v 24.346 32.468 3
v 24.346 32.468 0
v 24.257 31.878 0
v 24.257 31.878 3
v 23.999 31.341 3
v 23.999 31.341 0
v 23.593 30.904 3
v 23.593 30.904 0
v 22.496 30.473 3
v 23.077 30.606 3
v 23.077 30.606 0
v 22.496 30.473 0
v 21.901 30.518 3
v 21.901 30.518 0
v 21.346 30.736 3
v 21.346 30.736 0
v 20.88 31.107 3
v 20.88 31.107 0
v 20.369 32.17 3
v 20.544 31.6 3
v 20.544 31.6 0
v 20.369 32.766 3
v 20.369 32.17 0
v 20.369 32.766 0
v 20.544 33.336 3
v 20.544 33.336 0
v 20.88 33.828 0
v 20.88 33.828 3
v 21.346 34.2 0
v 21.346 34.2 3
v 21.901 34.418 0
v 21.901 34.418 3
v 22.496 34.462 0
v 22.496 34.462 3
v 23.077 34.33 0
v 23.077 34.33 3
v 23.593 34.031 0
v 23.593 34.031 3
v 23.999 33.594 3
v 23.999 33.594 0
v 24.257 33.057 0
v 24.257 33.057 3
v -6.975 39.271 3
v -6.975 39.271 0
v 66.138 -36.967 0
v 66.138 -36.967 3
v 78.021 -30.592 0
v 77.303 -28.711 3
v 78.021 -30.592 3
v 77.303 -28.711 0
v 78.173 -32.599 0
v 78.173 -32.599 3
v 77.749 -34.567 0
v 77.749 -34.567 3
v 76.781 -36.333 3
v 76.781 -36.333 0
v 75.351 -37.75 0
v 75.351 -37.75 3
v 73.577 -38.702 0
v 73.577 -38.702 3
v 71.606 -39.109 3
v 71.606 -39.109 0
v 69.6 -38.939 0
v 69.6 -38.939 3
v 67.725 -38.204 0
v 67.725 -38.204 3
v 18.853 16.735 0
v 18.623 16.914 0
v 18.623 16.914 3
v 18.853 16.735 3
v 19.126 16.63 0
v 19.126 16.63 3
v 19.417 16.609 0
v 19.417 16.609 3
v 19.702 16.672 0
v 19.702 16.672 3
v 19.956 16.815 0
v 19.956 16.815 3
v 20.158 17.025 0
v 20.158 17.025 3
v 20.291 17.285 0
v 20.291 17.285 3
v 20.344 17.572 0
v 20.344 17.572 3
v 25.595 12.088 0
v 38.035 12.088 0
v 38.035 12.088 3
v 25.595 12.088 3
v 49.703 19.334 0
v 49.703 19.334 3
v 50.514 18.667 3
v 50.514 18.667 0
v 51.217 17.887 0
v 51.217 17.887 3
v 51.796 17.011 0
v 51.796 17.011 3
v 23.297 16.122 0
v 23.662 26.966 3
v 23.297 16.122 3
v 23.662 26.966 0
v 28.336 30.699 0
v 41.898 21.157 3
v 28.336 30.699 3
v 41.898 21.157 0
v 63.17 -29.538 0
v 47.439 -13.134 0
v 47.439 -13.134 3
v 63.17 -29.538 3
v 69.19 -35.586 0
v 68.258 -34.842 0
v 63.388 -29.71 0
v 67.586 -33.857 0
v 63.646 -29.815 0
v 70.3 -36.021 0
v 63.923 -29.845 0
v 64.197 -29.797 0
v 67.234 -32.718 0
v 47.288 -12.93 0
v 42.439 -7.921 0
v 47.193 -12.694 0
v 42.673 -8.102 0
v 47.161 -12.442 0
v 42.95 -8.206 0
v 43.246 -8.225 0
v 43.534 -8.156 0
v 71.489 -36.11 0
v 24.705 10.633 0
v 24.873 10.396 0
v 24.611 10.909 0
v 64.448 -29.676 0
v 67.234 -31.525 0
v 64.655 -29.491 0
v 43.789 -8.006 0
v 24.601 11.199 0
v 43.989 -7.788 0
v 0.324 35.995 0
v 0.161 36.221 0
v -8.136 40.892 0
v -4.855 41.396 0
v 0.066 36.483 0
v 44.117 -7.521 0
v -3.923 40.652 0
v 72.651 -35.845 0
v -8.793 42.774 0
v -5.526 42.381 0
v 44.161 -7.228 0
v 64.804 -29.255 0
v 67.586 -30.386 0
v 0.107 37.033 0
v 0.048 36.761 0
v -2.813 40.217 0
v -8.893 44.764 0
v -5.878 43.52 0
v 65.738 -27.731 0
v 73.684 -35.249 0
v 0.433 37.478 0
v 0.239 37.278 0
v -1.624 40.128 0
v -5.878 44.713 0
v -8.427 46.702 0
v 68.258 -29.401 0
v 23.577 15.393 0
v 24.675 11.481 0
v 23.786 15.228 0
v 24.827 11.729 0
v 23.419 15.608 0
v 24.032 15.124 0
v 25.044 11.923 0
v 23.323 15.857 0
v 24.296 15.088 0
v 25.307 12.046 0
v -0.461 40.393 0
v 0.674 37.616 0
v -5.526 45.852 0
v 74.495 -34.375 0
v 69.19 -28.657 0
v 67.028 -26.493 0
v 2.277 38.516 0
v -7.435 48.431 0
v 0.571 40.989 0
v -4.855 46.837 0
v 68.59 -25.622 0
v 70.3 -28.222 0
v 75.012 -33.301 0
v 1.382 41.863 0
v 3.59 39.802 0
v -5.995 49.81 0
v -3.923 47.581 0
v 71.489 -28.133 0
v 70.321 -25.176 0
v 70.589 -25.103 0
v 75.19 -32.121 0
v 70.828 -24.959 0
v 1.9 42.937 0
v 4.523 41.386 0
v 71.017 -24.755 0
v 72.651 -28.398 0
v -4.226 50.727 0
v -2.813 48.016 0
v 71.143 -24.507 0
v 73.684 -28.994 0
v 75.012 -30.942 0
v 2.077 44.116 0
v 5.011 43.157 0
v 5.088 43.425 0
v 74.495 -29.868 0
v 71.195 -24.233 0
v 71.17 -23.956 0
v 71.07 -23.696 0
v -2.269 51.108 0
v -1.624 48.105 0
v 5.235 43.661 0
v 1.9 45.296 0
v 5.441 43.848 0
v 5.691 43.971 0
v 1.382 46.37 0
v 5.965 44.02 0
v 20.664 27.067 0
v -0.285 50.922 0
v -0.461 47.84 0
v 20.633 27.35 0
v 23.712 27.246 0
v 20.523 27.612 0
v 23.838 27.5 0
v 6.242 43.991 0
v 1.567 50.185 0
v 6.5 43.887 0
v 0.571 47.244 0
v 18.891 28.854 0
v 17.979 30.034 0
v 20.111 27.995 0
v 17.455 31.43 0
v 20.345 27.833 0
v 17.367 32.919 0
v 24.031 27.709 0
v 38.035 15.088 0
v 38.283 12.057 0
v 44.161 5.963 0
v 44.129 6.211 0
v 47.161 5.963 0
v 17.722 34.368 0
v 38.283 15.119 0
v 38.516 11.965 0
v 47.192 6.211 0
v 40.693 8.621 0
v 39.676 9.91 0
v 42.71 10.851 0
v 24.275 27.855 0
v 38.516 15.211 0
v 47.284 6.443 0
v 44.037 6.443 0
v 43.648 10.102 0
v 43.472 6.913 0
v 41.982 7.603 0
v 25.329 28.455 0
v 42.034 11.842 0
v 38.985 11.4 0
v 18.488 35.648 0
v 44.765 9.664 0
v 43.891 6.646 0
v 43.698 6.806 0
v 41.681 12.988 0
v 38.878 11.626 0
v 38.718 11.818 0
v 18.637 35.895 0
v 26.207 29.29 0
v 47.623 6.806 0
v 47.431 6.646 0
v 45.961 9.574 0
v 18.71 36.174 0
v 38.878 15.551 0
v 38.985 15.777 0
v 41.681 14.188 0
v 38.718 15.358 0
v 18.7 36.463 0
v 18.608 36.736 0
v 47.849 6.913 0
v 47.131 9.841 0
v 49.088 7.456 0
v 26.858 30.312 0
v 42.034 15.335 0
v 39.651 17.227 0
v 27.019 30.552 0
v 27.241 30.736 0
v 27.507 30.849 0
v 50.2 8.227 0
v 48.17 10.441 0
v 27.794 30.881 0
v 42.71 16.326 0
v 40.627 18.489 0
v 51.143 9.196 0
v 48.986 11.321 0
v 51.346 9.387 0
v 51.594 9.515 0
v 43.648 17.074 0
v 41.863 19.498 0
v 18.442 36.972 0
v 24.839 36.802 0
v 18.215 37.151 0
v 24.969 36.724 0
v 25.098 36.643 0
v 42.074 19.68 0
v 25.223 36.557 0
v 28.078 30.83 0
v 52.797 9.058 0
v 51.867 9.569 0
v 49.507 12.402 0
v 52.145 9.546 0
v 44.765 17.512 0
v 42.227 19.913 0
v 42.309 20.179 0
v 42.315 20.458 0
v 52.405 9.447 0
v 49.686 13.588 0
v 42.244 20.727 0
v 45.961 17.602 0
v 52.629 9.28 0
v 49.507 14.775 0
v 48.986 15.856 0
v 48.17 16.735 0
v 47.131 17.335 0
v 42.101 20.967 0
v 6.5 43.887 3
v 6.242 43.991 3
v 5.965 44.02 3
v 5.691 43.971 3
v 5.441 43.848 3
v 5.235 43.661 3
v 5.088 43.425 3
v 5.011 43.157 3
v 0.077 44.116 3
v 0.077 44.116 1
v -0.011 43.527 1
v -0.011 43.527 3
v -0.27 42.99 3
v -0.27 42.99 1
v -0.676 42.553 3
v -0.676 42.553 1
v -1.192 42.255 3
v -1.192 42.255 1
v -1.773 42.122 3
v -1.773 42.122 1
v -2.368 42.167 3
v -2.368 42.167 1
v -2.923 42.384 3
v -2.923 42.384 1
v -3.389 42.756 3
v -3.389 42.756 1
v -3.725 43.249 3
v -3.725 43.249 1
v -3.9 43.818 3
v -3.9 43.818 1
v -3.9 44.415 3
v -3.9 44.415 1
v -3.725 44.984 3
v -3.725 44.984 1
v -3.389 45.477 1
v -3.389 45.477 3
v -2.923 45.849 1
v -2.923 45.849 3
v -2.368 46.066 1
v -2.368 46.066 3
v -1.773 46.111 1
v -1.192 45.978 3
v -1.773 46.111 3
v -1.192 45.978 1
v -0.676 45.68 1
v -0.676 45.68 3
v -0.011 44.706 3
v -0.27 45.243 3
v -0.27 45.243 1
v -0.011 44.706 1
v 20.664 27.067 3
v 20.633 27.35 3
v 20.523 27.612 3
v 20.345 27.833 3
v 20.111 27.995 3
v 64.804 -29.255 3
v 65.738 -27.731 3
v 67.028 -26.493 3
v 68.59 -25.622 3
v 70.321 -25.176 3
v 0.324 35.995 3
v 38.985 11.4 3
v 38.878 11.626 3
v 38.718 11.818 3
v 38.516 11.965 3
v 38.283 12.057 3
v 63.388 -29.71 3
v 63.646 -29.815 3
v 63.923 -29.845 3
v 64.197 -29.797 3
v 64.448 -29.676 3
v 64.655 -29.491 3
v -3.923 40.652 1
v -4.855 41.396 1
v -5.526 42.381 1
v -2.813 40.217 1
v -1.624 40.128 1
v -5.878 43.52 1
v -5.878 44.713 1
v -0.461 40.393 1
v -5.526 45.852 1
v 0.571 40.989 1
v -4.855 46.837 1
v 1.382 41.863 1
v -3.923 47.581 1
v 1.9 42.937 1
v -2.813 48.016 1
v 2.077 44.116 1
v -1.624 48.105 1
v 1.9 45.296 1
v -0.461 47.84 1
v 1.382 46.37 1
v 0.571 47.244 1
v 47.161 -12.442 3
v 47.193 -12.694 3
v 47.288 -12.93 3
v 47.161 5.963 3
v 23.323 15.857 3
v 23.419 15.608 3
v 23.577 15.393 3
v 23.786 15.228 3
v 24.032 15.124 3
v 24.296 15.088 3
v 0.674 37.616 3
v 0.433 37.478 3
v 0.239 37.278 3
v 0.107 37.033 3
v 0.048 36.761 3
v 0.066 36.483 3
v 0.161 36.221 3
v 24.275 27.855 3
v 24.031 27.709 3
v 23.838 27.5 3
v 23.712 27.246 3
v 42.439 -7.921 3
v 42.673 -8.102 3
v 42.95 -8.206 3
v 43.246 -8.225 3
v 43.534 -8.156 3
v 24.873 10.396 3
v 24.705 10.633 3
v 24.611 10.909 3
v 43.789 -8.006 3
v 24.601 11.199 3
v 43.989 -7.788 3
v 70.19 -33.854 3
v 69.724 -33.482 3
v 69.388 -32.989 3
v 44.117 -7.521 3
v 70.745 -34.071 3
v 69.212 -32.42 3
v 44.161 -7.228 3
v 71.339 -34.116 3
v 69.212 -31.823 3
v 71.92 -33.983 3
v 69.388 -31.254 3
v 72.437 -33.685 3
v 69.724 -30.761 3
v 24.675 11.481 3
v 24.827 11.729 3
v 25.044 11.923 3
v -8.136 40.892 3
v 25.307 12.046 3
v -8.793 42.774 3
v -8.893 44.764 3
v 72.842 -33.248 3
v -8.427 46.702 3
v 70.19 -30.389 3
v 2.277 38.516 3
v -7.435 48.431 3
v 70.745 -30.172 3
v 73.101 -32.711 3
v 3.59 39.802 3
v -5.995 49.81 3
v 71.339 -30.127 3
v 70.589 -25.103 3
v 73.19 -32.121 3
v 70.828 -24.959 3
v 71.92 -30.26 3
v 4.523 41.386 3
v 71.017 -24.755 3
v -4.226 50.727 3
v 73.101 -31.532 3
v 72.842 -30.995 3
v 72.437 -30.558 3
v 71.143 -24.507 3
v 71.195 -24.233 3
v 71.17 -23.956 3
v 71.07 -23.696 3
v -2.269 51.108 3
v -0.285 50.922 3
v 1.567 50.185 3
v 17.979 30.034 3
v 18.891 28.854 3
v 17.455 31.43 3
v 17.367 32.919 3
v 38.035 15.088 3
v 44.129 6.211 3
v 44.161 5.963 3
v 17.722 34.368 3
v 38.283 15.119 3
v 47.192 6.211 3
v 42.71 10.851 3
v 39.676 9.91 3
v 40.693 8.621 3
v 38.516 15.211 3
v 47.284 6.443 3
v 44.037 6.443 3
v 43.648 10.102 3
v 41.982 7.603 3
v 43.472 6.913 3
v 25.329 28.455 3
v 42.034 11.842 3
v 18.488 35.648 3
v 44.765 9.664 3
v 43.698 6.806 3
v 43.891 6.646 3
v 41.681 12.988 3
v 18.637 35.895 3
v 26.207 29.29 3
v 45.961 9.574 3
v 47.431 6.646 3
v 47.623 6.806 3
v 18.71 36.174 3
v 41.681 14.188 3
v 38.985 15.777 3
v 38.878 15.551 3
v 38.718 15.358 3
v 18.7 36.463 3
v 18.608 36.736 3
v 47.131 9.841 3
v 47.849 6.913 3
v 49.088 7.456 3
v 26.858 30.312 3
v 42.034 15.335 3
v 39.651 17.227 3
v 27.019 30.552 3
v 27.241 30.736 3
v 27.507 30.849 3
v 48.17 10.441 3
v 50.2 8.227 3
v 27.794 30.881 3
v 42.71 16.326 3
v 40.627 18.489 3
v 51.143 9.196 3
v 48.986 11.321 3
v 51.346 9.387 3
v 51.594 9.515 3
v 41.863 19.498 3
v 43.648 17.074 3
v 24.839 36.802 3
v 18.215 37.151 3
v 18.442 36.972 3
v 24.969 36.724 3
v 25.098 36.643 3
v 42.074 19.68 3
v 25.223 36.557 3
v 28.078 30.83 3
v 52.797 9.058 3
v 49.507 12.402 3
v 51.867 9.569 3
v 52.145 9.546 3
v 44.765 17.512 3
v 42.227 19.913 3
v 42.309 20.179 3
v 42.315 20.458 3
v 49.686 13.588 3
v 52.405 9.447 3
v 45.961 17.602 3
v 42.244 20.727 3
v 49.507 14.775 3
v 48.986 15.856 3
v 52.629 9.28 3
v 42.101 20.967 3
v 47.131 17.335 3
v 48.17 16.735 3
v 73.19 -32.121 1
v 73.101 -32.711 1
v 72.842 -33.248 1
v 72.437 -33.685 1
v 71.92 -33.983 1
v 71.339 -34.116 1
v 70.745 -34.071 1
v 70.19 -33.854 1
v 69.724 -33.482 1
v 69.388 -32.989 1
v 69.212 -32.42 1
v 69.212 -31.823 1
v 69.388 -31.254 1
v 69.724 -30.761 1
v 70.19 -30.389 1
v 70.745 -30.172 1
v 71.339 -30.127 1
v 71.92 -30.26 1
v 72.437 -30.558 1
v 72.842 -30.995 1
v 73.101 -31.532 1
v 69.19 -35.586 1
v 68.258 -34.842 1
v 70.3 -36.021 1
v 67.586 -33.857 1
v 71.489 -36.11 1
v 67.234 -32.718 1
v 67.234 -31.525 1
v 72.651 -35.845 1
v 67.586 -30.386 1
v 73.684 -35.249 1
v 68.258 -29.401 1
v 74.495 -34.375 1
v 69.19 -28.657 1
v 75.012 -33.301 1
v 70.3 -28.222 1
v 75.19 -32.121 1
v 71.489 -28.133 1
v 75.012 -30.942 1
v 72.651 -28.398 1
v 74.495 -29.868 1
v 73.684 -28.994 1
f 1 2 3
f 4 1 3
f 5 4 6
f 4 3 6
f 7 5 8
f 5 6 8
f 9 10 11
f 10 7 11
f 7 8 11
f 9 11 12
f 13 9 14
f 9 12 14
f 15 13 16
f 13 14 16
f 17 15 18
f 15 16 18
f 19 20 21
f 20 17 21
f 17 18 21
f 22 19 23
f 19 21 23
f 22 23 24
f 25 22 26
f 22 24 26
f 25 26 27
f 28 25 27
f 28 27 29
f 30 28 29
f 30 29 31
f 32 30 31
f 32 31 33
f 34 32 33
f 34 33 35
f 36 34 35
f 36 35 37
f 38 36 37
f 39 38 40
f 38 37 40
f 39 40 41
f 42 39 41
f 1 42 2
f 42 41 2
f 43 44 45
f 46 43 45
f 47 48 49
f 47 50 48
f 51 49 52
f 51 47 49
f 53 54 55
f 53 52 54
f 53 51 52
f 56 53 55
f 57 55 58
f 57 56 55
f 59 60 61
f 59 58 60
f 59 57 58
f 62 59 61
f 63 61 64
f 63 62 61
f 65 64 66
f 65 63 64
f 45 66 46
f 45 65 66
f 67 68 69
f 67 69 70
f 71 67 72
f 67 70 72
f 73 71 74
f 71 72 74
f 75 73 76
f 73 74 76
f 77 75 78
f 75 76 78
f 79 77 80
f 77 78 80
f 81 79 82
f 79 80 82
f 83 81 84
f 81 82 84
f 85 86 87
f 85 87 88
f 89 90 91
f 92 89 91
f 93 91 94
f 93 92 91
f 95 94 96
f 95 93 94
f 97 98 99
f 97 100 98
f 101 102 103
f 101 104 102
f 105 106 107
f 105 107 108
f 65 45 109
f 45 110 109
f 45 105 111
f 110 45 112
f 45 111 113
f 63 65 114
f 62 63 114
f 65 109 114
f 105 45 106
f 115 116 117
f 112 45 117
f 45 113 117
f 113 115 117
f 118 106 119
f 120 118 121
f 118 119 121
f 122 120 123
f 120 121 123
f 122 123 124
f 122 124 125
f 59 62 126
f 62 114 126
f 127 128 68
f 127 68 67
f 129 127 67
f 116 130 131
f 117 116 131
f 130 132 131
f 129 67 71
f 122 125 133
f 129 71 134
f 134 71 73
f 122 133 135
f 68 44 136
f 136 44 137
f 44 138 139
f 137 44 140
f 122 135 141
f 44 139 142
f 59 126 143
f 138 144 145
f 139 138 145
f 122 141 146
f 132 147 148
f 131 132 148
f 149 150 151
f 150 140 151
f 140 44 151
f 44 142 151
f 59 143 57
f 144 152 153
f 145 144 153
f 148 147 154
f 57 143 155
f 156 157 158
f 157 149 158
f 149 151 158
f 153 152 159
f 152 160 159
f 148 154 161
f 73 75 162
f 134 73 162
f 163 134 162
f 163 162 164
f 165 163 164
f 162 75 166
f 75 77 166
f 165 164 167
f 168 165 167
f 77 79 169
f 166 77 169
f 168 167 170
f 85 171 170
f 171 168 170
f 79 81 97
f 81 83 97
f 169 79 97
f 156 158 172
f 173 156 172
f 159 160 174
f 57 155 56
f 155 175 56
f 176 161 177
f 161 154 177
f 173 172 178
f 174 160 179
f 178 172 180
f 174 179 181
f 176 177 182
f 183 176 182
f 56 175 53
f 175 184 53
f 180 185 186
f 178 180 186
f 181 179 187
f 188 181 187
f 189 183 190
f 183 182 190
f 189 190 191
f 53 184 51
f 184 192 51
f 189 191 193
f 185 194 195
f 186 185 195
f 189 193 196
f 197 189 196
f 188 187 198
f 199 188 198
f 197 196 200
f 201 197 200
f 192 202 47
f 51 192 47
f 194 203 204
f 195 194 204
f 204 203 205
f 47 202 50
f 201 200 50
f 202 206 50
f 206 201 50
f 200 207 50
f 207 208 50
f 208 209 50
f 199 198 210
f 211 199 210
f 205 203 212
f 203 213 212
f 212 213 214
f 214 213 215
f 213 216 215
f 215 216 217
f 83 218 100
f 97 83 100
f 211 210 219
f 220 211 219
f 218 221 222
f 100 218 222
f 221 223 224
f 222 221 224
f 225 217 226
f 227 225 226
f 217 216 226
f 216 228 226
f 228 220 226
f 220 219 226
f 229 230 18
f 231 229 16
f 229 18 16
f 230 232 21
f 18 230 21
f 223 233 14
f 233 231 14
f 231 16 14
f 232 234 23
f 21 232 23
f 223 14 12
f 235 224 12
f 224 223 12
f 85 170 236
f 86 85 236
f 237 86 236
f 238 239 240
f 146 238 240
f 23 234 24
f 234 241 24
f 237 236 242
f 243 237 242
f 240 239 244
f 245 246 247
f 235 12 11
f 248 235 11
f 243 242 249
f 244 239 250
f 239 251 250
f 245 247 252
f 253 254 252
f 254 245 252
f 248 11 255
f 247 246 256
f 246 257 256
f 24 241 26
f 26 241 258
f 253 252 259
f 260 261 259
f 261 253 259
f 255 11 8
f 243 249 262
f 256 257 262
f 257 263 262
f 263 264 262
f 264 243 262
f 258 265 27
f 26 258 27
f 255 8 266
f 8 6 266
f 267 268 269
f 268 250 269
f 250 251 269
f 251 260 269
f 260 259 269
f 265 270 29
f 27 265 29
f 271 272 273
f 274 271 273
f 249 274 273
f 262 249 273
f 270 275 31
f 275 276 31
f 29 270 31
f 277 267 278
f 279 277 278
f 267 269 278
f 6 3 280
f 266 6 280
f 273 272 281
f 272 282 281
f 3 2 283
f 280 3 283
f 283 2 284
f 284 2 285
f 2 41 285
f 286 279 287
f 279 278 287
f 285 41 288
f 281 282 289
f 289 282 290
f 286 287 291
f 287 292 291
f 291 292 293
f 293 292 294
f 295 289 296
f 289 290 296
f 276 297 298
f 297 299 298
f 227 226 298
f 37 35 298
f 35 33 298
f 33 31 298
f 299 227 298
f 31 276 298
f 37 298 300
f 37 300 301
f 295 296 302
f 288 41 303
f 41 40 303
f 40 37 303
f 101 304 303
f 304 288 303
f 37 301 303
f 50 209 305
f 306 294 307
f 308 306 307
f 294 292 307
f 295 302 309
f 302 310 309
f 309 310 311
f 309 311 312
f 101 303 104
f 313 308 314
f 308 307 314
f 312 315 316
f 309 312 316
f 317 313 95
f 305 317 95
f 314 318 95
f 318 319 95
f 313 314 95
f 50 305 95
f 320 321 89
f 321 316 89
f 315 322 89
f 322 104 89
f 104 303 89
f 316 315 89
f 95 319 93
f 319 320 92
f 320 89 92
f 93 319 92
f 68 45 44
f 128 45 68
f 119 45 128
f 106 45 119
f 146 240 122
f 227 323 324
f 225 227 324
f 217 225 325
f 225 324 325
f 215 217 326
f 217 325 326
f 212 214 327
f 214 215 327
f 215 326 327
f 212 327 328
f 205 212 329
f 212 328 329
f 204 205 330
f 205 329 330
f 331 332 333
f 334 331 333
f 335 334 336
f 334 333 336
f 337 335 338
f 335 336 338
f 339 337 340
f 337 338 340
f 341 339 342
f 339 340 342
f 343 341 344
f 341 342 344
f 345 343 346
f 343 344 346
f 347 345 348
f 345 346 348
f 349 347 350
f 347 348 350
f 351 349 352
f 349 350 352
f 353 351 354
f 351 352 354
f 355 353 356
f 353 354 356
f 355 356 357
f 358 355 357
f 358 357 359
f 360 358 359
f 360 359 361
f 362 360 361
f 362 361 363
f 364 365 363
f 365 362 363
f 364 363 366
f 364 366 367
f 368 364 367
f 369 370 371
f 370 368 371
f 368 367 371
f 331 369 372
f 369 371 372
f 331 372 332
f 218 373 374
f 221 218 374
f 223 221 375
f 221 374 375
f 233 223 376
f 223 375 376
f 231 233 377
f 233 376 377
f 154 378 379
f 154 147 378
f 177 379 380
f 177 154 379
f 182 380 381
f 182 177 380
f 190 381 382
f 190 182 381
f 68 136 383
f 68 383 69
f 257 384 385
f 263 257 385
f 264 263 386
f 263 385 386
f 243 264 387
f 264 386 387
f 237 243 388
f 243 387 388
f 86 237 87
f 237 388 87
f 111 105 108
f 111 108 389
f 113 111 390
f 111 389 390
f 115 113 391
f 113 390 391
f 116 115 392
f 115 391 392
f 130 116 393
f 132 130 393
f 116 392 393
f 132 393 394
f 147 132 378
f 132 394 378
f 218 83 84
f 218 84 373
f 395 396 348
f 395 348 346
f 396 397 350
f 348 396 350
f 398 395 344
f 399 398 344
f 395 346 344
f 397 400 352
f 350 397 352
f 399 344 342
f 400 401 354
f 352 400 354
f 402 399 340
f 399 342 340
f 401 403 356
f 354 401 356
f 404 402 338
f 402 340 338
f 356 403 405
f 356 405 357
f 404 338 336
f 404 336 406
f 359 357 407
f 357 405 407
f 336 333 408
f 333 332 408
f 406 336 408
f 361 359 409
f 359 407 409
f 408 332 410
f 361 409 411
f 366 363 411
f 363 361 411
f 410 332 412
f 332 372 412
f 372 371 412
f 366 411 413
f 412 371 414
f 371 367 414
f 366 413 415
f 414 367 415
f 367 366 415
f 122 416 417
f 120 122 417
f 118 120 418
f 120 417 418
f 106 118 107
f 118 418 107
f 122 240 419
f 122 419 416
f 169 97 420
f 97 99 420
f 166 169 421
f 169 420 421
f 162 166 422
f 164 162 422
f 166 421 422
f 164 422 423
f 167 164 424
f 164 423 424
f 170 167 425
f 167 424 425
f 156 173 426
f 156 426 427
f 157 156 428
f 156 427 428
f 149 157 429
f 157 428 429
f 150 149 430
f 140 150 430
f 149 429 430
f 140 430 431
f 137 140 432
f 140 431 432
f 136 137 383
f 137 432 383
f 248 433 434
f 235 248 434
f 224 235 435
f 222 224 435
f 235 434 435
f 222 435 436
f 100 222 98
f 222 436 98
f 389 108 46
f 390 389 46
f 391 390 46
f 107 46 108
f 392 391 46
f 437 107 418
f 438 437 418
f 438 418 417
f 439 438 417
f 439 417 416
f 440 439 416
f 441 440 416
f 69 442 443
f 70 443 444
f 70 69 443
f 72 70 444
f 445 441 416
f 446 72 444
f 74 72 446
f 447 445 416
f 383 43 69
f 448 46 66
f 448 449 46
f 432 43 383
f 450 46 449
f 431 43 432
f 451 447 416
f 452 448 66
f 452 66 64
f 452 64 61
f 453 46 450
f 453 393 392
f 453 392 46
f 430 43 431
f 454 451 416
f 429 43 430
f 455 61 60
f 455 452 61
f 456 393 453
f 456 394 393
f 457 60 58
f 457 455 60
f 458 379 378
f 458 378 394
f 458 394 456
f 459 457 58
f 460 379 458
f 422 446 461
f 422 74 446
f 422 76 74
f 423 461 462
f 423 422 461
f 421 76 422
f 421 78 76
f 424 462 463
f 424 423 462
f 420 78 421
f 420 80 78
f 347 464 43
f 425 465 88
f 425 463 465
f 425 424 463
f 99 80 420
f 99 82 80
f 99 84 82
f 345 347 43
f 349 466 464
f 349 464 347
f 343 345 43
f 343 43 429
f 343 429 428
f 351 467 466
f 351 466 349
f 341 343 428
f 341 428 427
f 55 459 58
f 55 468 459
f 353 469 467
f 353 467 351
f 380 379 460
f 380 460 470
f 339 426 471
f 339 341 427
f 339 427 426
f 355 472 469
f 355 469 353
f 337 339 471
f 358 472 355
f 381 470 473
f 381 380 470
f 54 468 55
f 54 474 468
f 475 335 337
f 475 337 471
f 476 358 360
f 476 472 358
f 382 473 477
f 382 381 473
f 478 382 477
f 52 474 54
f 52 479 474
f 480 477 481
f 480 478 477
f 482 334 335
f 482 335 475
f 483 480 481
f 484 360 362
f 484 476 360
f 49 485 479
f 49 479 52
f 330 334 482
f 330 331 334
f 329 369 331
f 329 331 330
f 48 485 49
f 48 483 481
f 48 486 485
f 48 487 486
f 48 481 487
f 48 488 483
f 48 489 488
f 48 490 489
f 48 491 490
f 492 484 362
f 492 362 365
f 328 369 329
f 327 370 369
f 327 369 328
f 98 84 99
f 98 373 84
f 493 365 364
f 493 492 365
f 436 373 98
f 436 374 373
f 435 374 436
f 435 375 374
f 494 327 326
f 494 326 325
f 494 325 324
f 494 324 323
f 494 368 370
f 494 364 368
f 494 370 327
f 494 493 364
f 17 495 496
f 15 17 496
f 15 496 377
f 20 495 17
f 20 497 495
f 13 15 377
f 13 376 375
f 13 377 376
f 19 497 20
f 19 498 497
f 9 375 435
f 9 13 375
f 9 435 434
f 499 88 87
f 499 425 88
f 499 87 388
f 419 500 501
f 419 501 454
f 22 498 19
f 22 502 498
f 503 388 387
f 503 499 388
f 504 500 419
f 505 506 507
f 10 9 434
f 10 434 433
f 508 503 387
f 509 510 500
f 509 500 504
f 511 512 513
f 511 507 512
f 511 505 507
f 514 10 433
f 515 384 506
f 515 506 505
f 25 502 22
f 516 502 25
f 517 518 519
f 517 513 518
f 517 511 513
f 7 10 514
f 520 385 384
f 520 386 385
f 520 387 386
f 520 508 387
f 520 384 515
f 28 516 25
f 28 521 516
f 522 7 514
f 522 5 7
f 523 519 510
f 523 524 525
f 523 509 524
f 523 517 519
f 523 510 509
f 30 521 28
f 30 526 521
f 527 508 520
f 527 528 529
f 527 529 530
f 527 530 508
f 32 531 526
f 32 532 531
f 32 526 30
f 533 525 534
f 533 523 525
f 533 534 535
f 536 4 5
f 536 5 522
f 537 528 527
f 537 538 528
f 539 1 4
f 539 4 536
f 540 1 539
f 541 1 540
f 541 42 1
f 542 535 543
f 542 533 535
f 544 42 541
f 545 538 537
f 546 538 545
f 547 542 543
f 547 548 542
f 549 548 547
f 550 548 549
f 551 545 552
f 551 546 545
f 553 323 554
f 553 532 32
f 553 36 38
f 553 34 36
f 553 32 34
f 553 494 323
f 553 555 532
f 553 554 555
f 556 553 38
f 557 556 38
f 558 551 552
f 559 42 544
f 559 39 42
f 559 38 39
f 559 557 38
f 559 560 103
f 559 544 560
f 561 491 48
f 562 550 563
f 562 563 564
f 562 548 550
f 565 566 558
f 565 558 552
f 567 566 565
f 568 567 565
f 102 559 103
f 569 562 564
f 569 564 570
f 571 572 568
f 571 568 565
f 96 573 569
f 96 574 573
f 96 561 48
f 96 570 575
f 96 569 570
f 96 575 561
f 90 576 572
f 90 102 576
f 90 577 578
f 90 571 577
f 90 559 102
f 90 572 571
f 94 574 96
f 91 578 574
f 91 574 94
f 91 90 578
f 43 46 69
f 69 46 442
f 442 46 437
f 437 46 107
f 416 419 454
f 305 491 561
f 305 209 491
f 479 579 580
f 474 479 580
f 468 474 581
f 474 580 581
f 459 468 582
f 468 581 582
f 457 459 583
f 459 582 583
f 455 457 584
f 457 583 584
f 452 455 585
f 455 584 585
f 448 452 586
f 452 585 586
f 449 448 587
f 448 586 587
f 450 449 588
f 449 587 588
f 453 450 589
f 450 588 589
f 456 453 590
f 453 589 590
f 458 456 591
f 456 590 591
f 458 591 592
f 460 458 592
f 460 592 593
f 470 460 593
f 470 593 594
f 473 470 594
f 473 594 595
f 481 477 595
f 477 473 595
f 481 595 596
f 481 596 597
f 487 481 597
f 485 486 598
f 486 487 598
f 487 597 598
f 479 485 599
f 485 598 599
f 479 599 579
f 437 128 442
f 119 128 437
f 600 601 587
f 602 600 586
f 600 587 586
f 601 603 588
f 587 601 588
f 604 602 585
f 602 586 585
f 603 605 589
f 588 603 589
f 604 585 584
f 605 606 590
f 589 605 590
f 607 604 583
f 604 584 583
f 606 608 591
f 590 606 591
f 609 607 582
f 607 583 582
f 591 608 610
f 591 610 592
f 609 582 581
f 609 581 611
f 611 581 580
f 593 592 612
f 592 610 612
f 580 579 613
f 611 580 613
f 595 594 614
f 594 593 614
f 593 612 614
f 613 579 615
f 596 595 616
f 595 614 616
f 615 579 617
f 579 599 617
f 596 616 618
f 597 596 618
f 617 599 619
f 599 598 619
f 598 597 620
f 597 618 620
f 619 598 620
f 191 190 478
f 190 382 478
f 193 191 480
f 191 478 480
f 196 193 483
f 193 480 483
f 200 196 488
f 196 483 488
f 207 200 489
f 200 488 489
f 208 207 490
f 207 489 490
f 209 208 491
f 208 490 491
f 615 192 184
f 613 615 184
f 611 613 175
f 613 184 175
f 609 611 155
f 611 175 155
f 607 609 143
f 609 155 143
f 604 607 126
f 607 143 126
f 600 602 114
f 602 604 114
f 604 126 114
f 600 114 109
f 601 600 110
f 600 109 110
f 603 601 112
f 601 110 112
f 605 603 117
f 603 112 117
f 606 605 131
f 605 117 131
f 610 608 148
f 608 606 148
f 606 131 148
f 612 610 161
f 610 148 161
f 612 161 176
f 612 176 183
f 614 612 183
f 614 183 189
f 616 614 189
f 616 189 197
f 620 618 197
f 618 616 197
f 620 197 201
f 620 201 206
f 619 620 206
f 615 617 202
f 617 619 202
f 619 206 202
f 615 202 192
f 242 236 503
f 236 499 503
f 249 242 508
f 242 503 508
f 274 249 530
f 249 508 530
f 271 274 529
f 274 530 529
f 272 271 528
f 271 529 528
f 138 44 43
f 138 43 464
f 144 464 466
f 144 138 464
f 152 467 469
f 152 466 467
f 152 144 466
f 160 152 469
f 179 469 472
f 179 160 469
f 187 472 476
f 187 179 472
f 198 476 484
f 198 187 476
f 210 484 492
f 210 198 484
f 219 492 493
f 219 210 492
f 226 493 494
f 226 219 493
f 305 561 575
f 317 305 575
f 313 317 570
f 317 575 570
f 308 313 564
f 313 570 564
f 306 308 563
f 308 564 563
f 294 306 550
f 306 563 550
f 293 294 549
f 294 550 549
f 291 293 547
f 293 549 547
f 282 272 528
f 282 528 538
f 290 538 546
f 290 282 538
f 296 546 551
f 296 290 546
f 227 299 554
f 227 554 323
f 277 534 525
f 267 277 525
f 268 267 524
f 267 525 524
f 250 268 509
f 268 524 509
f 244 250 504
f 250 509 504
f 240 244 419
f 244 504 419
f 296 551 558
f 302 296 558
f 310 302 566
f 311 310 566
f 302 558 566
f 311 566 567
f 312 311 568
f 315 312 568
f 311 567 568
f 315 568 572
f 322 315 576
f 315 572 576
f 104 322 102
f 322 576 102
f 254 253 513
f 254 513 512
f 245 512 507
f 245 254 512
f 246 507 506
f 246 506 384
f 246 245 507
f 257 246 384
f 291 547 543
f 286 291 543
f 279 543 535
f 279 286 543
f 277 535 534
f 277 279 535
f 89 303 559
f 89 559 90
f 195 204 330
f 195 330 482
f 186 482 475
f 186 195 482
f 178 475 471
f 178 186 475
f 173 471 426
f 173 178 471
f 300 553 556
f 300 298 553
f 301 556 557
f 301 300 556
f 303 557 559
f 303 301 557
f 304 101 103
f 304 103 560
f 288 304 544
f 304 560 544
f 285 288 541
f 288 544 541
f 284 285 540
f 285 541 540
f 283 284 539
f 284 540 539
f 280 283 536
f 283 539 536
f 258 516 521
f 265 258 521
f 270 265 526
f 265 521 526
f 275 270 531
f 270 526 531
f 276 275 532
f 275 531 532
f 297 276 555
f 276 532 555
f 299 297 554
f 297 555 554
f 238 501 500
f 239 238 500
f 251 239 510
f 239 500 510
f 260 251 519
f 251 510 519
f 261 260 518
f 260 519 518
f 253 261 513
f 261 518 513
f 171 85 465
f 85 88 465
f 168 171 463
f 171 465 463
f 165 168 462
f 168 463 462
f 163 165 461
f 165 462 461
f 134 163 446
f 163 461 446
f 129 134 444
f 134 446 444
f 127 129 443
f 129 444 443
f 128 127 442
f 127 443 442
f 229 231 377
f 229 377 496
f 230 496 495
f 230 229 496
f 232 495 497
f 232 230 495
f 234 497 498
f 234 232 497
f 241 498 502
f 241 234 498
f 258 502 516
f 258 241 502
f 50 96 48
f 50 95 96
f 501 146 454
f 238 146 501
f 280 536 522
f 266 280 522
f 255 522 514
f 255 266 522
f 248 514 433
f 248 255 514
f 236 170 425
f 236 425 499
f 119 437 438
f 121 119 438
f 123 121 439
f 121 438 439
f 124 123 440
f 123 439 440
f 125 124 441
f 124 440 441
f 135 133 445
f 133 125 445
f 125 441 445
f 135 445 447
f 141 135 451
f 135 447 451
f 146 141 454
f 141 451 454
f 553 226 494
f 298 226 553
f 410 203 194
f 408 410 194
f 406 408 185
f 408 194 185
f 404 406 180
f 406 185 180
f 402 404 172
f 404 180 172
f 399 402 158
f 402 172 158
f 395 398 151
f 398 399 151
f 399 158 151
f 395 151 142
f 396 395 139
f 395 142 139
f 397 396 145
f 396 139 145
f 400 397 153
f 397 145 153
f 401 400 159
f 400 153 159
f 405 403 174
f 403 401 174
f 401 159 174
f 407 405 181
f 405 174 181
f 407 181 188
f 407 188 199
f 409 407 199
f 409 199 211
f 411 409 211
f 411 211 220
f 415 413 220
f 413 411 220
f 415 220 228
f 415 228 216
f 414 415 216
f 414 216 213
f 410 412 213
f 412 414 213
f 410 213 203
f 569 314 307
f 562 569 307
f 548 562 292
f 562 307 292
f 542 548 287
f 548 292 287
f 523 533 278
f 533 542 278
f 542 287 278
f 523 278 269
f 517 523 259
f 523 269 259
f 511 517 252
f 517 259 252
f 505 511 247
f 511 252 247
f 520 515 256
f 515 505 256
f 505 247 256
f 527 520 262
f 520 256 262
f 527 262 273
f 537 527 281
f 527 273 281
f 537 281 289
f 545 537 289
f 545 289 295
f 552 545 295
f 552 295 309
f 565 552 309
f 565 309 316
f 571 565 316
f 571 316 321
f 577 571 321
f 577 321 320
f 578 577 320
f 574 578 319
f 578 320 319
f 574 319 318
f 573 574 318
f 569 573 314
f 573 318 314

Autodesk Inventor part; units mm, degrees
ref_plane "YZ Plane" through (0, 0, 0) normal (1, 0, 0) x (0, 1, 0)
ref_plane "XZ Plane" through (0, 0, 0) normal (0, 1, 0) x (-1, 0, 0)
ref_plane "XY Plane" through (0, 0, 0) normal (0, 0, 1) x (1, 0, 0)
sketch "スケッチ1" plane through (0, 0, 0) normal (0, 0, 1) x (1, 0, 0)
  circle A0 centre (-1.9226, 44.1165) radius 4
  circle A1 centre (71.1898, -32.1215) radius 4
  circle A2 centre (71.1898, -32.1215) radius 2
  circle A3 centre (-1.9226, 44.1165) radius 2
  circle A4 centre (22.3463, 32.4678) radius 2
  circle A5 centre (45.6606, 13.5882) radius 4.025
  arc A6 (1.567, 50.1847) -> (-6.9748, 39.2714) centre (-1.9226, 44.1165) ccw
  arc A7 (66.1375, -36.9666) -> (77.3028, -28.7112) centre (71.1898, -32.1215) ccw
  arc A8 (51.7955, 17.0107) -> (49.703, 19.3336) centre (45.6606, 13.5882) ccw
  arc A9 (25.2234, 36.5571) -> (24.8388, 36.8022) centre (22.3463, 32.4678) ccw
  line L0 (1.567, 50.1847) -> (24.8388, 36.8022)
  line L1 (25.2234, 36.5571) -> (49.703, 19.3336)
  line L2 (51.7955, 17.0107) -> (77.3028, -28.7112)
  line L3 (-6.9748, 39.2714) -> (66.1375, -36.9666)
  point P0 (0, 0)
  point P1 (0, 0)
  dimension "d0" = 3
  dimension "d1" = 3
  dimension "d2" = 3
  dimension "d3" = 3
extrude "押し出し1" add sketch "スケッチ1" along normal blind 3 contours A0 | A1 | L0 A9 L1 A8 L2 A7 L3 A6
extrude "押し出し2" cut sketch "スケッチ1" along normal blind 1 contours A0 | A1
sketch "スケッチ2" plane through (0, 0, 0) normal (0, 0, -1) x (-1, 0, 0)
  circle A0 centre (1.9226, 44.1165) radius 4 projected
  circle A1 centre (-71.1898, -32.1215) radius 4 projected
  arc A2 (-77.3028, -28.7112) -> (-66.1375, -36.9666) centre (-71.1898, -32.1215) ccw projected
  line L0 (6.9748, 39.2714) -> (-66.1375, -36.9666) projected
  arc A3 (6.9748, 39.2714) -> (-1.567, 50.1847) centre (1.9226, 44.1165) ccw projected
  line L1 (-24.8388, 36.8022) -> (-1.567, 50.1847) projected
  arc A4 (-24.8388, 36.8022) -> (-25.2234, 36.5571) centre (-22.3463, 32.4678) ccw projected
  line L2 (-49.703, 19.3336) -> (-25.2234, 36.5571) projected
  arc A5 (-49.703, 19.3336) -> (-51.7955, 17.0107) centre (-45.6606, 13.5882) ccw projected
  line L3 (-77.3028, -28.7112) -> (-51.7955, 17.0107) projected
  circle A6 centre (-22.3463, 32.4678) radius 2 projected
  circle A7 centre (-45.6606, 13.5882) radius 4.025 projected
  arc A8 (-23.3433, 34.2016) -> (-23.4971, 34.1035) centre (-22.3463, 32.4678) ccw
  line L4 (-23.3433, 34.2016) -> (-0.0714, 47.5841)
  arc A9 (4.8096, 41.3479) -> (-0.0714, 47.5841) centre (1.9226, 44.1165) ccw
  line L5 (4.8096, 41.3479) -> (-68.3028, -34.8902)
  arc A10 (-74.683, -30.1728) -> (-68.3028, -34.8902) centre (-71.1898, -32.1215) ccw
  line L6 (-74.683, -30.1728) -> (-49.1757, 15.5492)
  arc A11 (-47.9767, 16.8801) -> (-49.1757, 15.5492) centre (-45.6606, 13.5882) ccw
  line L7 (-47.9767, 16.8801) -> (-23.4971, 34.1035)
  circle A12 centre (1.9226, 44.1165) radius 7
  circle A13 centre (-71.1898, -32.1215) radius 7
  circle A14 centre (-45.6606, 13.5882) radius 7.025
  circle A15 centre (-22.3463, 32.4678) radius 5
  line L8 (-45.6606, 13.5882) -> (-5.0774, 13.5882) construction
  line L9 (-45.6606, 12.0882) -> (-5.0774, 12.0882)
  line L10 (-5.0774, 15.0882) -> (-45.6606, 15.0882)
  arc A16 (-45.6606, 15.0882) -> (-45.6606, 12.0882) centre (-45.6606, 13.5882) ccw
  arc A17 (-5.0774, 12.0882) -> (-5.0774, 15.0882) centre (-5.0774, 13.5882) ccw
  line L11 (-45.6606, 13.5882) -> (-45.6606, -36.9666) construction
  line L12 (-47.1606, 13.5882) -> (-47.1606, -36.9666)
  line L13 (-44.1606, -36.9666) -> (-44.1606, 13.5882)
  arc A18 (-44.1606, 13.5882) -> (-47.1606, 13.5882) centre (-45.6606, 13.5882) ccw
  arc A19 (-47.1606, -36.9666) -> (-44.1606, -36.9666) centre (-45.6606, -36.9666) ccw
  line L14 (-22.3463, 32.4678) -> (-21.0148, -7.0629) construction
  line L15 (-23.8454, 32.4173) -> (-22.514, -7.1134)
  line L16 (-19.5157, -7.0124) -> (-20.8471, 32.5183)
  arc A20 (-20.8471, 32.5183) -> (-23.8454, 32.4173) centre (-22.3463, 32.4678) ccw
  arc A21 (-22.514, -7.1134) -> (-19.5157, -7.0124) centre (-21.0148, -7.0629) ccw
  point P0 (0, 0)
  point P1 (-25.369, 13.5882)
  point P2 (-45.6606, -11.6892)
  point P3 (-38.7977, 15.0882)
  point P4 (-20.3735, 15.0882)
  point P5 (0.8334, 37.2018)
  point P6 (-5.0513, 44.7204)
  point P7 (-19.3707, 36.486)
  point P8 (-27.245, 31.4666)
  point P9 (-43.2679, 20.1931)
  point P10 (-44.1606, 6.7252)
  point P11 (-44.1606, -9.7159)
  point P12 (-23.2505, 12.0882)
  point P13 (-38.7977, 12.0882)
  point P14 (-47.1606, -12.8441)
  point P15 (-47.1606, 6.7252)
  point P16 (-51.9807, 10.5211)
  point P17 (-71.8842, -25.1561)
  point P18 (-64.3266, -30.744)
  point P19 (-21.6805, 12.7025)
  point P20 (-23.2618, 15.0882)
  point P21 (-23.6849, 27.6503)
  point P22 (-20.6866, 27.7513)
  point P23 (-20.2639, 15.2025)
  dimension "d8" = 3
  dimension "d9" = 3
  dimension "d10" = 3
  dimension "d11" = 3
  dimension "d12" = 3
  dimension "d13" = 3
  dimension "d14" = 3
  dimension "d17" = 3
extrude "押し出し3" cut sketch "スケッチ2" against normal through all contours A12 L5 L16 A15 L4 | L10 A14 L7 A15 L15 | L5 L13 A14 L9 | A14 L12 L5 A13 L6
fillet "フィレット1" radius 1 19 edges at (71.8842, -25.1561, 1.5) (64.3266, -30.744, 1.5) (47.1606, -12.8441, 1.5) (47.1606, 6.7252, 1.5) (51.9807, 10.5211, 1.5) (44.1606, 6.7252, 1.5) (44.1606, -9.7159, 1.5) (23.2505, 12.0882, 1.5) (23.2618, 15.0882, 1.5) (38.7977, 12.0882, 1.5) (38.7977, 15.0882, 1.5) (43.2679, 20.1931, 1.5) (23.6849, 27.6503, 1.5) (27.245, 31.4666, 1.5) (20.2639, 15.2025, 1.5) (20.6866, 27.7513, 1.5) (19.3707, 36.486, 1.5) (5.0513, 44.7204, 1.5) (-0.8334, 37.2018, 1.5)
sketch "スケッチ3" plane through (0, 0, 0) normal (0, 0, -1) x (-1, 0, 0)
  arc A0 (-64.8037, -29.2549) -> (-70.3207, -25.1757) centre (-71.1898, -32.1215) ccw projected
  arc A1 (-71.0698, -23.6962) -> (-70.3207, -25.1757) centre (-70.1965, -24.1834) ccw projected
  line L0 (-71.0698, -23.6962) -> (-52.797, 9.0579) projected
  arc A2 (-51.1432, 9.196) -> (-52.797, 9.0579) centre (-51.9237, 8.5707) ccw projected
  arc A3 (-51.1432, 9.196) -> (-47.8491, 6.9128) centre (-45.6606, 13.5882) ccw projected
  arc A4 (-47.1606, 5.9625) -> (-47.8491, 6.9128) centre (-48.1606, 5.9625) ccw projected
  line L1 (-47.1606, 5.9625) -> (-47.1606, -12.4421) projected
  arc A5 (-47.4389, -13.1343) -> (-47.1606, -12.4421) centre (-48.1606, -12.4421) ccw projected
  line L2 (-47.4389, -13.1343) -> (-63.1696, -29.5375) projected
  arc A6 (-64.8037, -29.2549) -> (-63.1696, -29.5375) centre (-63.8914, -28.8454) ccw projected
  line L3 (-24.296, 15.0882) -> (-38.035, 15.0882) projected
  arc A7 (-38.9852, 15.7767) -> (-38.035, 15.0882) centre (-38.035, 16.0882) ccw projected
  arc A8 (-38.9852, 15.7767) -> (-41.8628, 19.4981) centre (-45.6606, 13.5882) ccw projected
  arc A9 (-41.8976, 21.1572) -> (-41.8628, 19.4981) centre (-41.3222, 20.3394) ccw projected
  line L4 (-41.8976, 21.1572) -> (-28.3356, 30.6992) projected
  arc A10 (-26.8579, 30.3125) -> (-28.3356, 30.6992) centre (-27.7602, 29.8814) ccw projected
  arc A11 (-26.8579, 30.3125) -> (-24.2754, 27.855) centre (-22.3463, 32.4678) ccw projected
  arc A12 (-23.6618, 26.9661) -> (-24.2754, 27.855) centre (-24.6612, 26.9324) ccw projected
  line L5 (-23.6618, 26.9661) -> (-23.2966, 16.1219) projected
  arc A13 (-24.296, 15.0882) -> (-23.2966, 16.1219) centre (-24.296, 16.0882) ccw projected
  line L6 (-44.1606, -7.2284) -> (-44.1606, 5.9625) projected
  arc A14 (-43.4722, 6.9128) -> (-44.1606, 5.9625) centre (-43.1606, 5.9625) ccw projected
  arc A15 (-43.4722, 6.9128) -> (-38.9852, 11.3997) centre (-45.6606, 13.5882) ccw projected
  arc A16 (-38.035, 12.0882) -> (-38.9852, 11.3997) centre (-38.035, 11.0882) ccw projected
  line L7 (-38.035, 12.0882) -> (-25.595, 12.0882) projected
  arc A17 (-24.8733, 10.396) -> (-25.595, 12.0882) centre (-25.595, 11.0882) ccw projected
  line L8 (-24.8733, 10.396) -> (-42.4389, -7.9205) projected
  arc A18 (-44.1606, -7.2284) -> (-42.4389, -7.9205) centre (-43.1606, -7.2284) ccw projected
  line L9 (-18.2147, 37.1508) -> (-6.5004, 43.8871) projected
  arc A19 (-5.0114, 43.1572) -> (-6.5004, 43.8871) centre (-6.0019, 43.0202) ccw projected
  arc A20 (-5.0114, 43.1572) -> (-0.6744, 37.6161) centre (1.9226, 44.1165) ccw projected
  arc A21 (-0.3236, 35.9953) -> (-0.6744, 37.6161) centre (-1.0454, 36.6874) ccw projected
  line L10 (-0.3236, 35.9953) -> (-18.6225, 16.914) projected
  arc A22 (-20.3437, 17.5725) -> (-18.6225, 16.914) centre (-19.3443, 17.6062) ccw projected
  line L11 (-20.3437, 17.5725) -> (-20.6635, 27.067) projected
  arc A23 (-20.1111, 27.9952) -> (-20.6635, 27.067) centre (-19.6641, 27.1007) ccw projected
  arc A24 (-20.1111, 27.9952) -> (-18.4879, 35.6479) centre (-22.3463, 32.4678) ccw projected
  arc A25 (-18.2147, 37.1508) -> (-18.4879, 35.6479) centre (-17.7162, 36.2839) ccw projected
  circle A26 centre (1.9226, 44.1165) radius 4 projected
  circle A27 centre (-71.1898, -32.1215) radius 4 projected
  arc A28 (-77.3028, -28.7112) -> (-66.1375, -36.9666) centre (-71.1898, -32.1215) ccw projected
  line L12 (6.9748, 39.2714) -> (-66.1375, -36.9666) projected
  arc A29 (6.9748, 39.2714) -> (-1.567, 50.1847) centre (1.9226, 44.1165) ccw projected
  line L13 (-24.8388, 36.8022) -> (-1.567, 50.1847) projected
  arc A30 (-24.8388, 36.8022) -> (-25.2234, 36.5571) centre (-22.3463, 32.4678) ccw projected
  line L14 (-49.703, 19.3336) -> (-25.2234, 36.5571) projected
  arc A31 (-49.703, 19.3336) -> (-51.7955, 17.0107) centre (-45.6606, 13.5882) ccw projected
  line L15 (-77.3028, -28.7112) -> (-51.7955, 17.0107) projected
  circle A32 centre (-22.3463, 32.4678) radius 2 projected
  circle A33 centre (-45.6606, 13.5882) radius 4.025 projected
  circle A34 centre (1.9226, 44.1165) radius 2 projected
  circle A35 centre (-71.1898, -32.1215) radius 2 projected
  point P0 (0, 0)
properties part number "アームフレーム小"
